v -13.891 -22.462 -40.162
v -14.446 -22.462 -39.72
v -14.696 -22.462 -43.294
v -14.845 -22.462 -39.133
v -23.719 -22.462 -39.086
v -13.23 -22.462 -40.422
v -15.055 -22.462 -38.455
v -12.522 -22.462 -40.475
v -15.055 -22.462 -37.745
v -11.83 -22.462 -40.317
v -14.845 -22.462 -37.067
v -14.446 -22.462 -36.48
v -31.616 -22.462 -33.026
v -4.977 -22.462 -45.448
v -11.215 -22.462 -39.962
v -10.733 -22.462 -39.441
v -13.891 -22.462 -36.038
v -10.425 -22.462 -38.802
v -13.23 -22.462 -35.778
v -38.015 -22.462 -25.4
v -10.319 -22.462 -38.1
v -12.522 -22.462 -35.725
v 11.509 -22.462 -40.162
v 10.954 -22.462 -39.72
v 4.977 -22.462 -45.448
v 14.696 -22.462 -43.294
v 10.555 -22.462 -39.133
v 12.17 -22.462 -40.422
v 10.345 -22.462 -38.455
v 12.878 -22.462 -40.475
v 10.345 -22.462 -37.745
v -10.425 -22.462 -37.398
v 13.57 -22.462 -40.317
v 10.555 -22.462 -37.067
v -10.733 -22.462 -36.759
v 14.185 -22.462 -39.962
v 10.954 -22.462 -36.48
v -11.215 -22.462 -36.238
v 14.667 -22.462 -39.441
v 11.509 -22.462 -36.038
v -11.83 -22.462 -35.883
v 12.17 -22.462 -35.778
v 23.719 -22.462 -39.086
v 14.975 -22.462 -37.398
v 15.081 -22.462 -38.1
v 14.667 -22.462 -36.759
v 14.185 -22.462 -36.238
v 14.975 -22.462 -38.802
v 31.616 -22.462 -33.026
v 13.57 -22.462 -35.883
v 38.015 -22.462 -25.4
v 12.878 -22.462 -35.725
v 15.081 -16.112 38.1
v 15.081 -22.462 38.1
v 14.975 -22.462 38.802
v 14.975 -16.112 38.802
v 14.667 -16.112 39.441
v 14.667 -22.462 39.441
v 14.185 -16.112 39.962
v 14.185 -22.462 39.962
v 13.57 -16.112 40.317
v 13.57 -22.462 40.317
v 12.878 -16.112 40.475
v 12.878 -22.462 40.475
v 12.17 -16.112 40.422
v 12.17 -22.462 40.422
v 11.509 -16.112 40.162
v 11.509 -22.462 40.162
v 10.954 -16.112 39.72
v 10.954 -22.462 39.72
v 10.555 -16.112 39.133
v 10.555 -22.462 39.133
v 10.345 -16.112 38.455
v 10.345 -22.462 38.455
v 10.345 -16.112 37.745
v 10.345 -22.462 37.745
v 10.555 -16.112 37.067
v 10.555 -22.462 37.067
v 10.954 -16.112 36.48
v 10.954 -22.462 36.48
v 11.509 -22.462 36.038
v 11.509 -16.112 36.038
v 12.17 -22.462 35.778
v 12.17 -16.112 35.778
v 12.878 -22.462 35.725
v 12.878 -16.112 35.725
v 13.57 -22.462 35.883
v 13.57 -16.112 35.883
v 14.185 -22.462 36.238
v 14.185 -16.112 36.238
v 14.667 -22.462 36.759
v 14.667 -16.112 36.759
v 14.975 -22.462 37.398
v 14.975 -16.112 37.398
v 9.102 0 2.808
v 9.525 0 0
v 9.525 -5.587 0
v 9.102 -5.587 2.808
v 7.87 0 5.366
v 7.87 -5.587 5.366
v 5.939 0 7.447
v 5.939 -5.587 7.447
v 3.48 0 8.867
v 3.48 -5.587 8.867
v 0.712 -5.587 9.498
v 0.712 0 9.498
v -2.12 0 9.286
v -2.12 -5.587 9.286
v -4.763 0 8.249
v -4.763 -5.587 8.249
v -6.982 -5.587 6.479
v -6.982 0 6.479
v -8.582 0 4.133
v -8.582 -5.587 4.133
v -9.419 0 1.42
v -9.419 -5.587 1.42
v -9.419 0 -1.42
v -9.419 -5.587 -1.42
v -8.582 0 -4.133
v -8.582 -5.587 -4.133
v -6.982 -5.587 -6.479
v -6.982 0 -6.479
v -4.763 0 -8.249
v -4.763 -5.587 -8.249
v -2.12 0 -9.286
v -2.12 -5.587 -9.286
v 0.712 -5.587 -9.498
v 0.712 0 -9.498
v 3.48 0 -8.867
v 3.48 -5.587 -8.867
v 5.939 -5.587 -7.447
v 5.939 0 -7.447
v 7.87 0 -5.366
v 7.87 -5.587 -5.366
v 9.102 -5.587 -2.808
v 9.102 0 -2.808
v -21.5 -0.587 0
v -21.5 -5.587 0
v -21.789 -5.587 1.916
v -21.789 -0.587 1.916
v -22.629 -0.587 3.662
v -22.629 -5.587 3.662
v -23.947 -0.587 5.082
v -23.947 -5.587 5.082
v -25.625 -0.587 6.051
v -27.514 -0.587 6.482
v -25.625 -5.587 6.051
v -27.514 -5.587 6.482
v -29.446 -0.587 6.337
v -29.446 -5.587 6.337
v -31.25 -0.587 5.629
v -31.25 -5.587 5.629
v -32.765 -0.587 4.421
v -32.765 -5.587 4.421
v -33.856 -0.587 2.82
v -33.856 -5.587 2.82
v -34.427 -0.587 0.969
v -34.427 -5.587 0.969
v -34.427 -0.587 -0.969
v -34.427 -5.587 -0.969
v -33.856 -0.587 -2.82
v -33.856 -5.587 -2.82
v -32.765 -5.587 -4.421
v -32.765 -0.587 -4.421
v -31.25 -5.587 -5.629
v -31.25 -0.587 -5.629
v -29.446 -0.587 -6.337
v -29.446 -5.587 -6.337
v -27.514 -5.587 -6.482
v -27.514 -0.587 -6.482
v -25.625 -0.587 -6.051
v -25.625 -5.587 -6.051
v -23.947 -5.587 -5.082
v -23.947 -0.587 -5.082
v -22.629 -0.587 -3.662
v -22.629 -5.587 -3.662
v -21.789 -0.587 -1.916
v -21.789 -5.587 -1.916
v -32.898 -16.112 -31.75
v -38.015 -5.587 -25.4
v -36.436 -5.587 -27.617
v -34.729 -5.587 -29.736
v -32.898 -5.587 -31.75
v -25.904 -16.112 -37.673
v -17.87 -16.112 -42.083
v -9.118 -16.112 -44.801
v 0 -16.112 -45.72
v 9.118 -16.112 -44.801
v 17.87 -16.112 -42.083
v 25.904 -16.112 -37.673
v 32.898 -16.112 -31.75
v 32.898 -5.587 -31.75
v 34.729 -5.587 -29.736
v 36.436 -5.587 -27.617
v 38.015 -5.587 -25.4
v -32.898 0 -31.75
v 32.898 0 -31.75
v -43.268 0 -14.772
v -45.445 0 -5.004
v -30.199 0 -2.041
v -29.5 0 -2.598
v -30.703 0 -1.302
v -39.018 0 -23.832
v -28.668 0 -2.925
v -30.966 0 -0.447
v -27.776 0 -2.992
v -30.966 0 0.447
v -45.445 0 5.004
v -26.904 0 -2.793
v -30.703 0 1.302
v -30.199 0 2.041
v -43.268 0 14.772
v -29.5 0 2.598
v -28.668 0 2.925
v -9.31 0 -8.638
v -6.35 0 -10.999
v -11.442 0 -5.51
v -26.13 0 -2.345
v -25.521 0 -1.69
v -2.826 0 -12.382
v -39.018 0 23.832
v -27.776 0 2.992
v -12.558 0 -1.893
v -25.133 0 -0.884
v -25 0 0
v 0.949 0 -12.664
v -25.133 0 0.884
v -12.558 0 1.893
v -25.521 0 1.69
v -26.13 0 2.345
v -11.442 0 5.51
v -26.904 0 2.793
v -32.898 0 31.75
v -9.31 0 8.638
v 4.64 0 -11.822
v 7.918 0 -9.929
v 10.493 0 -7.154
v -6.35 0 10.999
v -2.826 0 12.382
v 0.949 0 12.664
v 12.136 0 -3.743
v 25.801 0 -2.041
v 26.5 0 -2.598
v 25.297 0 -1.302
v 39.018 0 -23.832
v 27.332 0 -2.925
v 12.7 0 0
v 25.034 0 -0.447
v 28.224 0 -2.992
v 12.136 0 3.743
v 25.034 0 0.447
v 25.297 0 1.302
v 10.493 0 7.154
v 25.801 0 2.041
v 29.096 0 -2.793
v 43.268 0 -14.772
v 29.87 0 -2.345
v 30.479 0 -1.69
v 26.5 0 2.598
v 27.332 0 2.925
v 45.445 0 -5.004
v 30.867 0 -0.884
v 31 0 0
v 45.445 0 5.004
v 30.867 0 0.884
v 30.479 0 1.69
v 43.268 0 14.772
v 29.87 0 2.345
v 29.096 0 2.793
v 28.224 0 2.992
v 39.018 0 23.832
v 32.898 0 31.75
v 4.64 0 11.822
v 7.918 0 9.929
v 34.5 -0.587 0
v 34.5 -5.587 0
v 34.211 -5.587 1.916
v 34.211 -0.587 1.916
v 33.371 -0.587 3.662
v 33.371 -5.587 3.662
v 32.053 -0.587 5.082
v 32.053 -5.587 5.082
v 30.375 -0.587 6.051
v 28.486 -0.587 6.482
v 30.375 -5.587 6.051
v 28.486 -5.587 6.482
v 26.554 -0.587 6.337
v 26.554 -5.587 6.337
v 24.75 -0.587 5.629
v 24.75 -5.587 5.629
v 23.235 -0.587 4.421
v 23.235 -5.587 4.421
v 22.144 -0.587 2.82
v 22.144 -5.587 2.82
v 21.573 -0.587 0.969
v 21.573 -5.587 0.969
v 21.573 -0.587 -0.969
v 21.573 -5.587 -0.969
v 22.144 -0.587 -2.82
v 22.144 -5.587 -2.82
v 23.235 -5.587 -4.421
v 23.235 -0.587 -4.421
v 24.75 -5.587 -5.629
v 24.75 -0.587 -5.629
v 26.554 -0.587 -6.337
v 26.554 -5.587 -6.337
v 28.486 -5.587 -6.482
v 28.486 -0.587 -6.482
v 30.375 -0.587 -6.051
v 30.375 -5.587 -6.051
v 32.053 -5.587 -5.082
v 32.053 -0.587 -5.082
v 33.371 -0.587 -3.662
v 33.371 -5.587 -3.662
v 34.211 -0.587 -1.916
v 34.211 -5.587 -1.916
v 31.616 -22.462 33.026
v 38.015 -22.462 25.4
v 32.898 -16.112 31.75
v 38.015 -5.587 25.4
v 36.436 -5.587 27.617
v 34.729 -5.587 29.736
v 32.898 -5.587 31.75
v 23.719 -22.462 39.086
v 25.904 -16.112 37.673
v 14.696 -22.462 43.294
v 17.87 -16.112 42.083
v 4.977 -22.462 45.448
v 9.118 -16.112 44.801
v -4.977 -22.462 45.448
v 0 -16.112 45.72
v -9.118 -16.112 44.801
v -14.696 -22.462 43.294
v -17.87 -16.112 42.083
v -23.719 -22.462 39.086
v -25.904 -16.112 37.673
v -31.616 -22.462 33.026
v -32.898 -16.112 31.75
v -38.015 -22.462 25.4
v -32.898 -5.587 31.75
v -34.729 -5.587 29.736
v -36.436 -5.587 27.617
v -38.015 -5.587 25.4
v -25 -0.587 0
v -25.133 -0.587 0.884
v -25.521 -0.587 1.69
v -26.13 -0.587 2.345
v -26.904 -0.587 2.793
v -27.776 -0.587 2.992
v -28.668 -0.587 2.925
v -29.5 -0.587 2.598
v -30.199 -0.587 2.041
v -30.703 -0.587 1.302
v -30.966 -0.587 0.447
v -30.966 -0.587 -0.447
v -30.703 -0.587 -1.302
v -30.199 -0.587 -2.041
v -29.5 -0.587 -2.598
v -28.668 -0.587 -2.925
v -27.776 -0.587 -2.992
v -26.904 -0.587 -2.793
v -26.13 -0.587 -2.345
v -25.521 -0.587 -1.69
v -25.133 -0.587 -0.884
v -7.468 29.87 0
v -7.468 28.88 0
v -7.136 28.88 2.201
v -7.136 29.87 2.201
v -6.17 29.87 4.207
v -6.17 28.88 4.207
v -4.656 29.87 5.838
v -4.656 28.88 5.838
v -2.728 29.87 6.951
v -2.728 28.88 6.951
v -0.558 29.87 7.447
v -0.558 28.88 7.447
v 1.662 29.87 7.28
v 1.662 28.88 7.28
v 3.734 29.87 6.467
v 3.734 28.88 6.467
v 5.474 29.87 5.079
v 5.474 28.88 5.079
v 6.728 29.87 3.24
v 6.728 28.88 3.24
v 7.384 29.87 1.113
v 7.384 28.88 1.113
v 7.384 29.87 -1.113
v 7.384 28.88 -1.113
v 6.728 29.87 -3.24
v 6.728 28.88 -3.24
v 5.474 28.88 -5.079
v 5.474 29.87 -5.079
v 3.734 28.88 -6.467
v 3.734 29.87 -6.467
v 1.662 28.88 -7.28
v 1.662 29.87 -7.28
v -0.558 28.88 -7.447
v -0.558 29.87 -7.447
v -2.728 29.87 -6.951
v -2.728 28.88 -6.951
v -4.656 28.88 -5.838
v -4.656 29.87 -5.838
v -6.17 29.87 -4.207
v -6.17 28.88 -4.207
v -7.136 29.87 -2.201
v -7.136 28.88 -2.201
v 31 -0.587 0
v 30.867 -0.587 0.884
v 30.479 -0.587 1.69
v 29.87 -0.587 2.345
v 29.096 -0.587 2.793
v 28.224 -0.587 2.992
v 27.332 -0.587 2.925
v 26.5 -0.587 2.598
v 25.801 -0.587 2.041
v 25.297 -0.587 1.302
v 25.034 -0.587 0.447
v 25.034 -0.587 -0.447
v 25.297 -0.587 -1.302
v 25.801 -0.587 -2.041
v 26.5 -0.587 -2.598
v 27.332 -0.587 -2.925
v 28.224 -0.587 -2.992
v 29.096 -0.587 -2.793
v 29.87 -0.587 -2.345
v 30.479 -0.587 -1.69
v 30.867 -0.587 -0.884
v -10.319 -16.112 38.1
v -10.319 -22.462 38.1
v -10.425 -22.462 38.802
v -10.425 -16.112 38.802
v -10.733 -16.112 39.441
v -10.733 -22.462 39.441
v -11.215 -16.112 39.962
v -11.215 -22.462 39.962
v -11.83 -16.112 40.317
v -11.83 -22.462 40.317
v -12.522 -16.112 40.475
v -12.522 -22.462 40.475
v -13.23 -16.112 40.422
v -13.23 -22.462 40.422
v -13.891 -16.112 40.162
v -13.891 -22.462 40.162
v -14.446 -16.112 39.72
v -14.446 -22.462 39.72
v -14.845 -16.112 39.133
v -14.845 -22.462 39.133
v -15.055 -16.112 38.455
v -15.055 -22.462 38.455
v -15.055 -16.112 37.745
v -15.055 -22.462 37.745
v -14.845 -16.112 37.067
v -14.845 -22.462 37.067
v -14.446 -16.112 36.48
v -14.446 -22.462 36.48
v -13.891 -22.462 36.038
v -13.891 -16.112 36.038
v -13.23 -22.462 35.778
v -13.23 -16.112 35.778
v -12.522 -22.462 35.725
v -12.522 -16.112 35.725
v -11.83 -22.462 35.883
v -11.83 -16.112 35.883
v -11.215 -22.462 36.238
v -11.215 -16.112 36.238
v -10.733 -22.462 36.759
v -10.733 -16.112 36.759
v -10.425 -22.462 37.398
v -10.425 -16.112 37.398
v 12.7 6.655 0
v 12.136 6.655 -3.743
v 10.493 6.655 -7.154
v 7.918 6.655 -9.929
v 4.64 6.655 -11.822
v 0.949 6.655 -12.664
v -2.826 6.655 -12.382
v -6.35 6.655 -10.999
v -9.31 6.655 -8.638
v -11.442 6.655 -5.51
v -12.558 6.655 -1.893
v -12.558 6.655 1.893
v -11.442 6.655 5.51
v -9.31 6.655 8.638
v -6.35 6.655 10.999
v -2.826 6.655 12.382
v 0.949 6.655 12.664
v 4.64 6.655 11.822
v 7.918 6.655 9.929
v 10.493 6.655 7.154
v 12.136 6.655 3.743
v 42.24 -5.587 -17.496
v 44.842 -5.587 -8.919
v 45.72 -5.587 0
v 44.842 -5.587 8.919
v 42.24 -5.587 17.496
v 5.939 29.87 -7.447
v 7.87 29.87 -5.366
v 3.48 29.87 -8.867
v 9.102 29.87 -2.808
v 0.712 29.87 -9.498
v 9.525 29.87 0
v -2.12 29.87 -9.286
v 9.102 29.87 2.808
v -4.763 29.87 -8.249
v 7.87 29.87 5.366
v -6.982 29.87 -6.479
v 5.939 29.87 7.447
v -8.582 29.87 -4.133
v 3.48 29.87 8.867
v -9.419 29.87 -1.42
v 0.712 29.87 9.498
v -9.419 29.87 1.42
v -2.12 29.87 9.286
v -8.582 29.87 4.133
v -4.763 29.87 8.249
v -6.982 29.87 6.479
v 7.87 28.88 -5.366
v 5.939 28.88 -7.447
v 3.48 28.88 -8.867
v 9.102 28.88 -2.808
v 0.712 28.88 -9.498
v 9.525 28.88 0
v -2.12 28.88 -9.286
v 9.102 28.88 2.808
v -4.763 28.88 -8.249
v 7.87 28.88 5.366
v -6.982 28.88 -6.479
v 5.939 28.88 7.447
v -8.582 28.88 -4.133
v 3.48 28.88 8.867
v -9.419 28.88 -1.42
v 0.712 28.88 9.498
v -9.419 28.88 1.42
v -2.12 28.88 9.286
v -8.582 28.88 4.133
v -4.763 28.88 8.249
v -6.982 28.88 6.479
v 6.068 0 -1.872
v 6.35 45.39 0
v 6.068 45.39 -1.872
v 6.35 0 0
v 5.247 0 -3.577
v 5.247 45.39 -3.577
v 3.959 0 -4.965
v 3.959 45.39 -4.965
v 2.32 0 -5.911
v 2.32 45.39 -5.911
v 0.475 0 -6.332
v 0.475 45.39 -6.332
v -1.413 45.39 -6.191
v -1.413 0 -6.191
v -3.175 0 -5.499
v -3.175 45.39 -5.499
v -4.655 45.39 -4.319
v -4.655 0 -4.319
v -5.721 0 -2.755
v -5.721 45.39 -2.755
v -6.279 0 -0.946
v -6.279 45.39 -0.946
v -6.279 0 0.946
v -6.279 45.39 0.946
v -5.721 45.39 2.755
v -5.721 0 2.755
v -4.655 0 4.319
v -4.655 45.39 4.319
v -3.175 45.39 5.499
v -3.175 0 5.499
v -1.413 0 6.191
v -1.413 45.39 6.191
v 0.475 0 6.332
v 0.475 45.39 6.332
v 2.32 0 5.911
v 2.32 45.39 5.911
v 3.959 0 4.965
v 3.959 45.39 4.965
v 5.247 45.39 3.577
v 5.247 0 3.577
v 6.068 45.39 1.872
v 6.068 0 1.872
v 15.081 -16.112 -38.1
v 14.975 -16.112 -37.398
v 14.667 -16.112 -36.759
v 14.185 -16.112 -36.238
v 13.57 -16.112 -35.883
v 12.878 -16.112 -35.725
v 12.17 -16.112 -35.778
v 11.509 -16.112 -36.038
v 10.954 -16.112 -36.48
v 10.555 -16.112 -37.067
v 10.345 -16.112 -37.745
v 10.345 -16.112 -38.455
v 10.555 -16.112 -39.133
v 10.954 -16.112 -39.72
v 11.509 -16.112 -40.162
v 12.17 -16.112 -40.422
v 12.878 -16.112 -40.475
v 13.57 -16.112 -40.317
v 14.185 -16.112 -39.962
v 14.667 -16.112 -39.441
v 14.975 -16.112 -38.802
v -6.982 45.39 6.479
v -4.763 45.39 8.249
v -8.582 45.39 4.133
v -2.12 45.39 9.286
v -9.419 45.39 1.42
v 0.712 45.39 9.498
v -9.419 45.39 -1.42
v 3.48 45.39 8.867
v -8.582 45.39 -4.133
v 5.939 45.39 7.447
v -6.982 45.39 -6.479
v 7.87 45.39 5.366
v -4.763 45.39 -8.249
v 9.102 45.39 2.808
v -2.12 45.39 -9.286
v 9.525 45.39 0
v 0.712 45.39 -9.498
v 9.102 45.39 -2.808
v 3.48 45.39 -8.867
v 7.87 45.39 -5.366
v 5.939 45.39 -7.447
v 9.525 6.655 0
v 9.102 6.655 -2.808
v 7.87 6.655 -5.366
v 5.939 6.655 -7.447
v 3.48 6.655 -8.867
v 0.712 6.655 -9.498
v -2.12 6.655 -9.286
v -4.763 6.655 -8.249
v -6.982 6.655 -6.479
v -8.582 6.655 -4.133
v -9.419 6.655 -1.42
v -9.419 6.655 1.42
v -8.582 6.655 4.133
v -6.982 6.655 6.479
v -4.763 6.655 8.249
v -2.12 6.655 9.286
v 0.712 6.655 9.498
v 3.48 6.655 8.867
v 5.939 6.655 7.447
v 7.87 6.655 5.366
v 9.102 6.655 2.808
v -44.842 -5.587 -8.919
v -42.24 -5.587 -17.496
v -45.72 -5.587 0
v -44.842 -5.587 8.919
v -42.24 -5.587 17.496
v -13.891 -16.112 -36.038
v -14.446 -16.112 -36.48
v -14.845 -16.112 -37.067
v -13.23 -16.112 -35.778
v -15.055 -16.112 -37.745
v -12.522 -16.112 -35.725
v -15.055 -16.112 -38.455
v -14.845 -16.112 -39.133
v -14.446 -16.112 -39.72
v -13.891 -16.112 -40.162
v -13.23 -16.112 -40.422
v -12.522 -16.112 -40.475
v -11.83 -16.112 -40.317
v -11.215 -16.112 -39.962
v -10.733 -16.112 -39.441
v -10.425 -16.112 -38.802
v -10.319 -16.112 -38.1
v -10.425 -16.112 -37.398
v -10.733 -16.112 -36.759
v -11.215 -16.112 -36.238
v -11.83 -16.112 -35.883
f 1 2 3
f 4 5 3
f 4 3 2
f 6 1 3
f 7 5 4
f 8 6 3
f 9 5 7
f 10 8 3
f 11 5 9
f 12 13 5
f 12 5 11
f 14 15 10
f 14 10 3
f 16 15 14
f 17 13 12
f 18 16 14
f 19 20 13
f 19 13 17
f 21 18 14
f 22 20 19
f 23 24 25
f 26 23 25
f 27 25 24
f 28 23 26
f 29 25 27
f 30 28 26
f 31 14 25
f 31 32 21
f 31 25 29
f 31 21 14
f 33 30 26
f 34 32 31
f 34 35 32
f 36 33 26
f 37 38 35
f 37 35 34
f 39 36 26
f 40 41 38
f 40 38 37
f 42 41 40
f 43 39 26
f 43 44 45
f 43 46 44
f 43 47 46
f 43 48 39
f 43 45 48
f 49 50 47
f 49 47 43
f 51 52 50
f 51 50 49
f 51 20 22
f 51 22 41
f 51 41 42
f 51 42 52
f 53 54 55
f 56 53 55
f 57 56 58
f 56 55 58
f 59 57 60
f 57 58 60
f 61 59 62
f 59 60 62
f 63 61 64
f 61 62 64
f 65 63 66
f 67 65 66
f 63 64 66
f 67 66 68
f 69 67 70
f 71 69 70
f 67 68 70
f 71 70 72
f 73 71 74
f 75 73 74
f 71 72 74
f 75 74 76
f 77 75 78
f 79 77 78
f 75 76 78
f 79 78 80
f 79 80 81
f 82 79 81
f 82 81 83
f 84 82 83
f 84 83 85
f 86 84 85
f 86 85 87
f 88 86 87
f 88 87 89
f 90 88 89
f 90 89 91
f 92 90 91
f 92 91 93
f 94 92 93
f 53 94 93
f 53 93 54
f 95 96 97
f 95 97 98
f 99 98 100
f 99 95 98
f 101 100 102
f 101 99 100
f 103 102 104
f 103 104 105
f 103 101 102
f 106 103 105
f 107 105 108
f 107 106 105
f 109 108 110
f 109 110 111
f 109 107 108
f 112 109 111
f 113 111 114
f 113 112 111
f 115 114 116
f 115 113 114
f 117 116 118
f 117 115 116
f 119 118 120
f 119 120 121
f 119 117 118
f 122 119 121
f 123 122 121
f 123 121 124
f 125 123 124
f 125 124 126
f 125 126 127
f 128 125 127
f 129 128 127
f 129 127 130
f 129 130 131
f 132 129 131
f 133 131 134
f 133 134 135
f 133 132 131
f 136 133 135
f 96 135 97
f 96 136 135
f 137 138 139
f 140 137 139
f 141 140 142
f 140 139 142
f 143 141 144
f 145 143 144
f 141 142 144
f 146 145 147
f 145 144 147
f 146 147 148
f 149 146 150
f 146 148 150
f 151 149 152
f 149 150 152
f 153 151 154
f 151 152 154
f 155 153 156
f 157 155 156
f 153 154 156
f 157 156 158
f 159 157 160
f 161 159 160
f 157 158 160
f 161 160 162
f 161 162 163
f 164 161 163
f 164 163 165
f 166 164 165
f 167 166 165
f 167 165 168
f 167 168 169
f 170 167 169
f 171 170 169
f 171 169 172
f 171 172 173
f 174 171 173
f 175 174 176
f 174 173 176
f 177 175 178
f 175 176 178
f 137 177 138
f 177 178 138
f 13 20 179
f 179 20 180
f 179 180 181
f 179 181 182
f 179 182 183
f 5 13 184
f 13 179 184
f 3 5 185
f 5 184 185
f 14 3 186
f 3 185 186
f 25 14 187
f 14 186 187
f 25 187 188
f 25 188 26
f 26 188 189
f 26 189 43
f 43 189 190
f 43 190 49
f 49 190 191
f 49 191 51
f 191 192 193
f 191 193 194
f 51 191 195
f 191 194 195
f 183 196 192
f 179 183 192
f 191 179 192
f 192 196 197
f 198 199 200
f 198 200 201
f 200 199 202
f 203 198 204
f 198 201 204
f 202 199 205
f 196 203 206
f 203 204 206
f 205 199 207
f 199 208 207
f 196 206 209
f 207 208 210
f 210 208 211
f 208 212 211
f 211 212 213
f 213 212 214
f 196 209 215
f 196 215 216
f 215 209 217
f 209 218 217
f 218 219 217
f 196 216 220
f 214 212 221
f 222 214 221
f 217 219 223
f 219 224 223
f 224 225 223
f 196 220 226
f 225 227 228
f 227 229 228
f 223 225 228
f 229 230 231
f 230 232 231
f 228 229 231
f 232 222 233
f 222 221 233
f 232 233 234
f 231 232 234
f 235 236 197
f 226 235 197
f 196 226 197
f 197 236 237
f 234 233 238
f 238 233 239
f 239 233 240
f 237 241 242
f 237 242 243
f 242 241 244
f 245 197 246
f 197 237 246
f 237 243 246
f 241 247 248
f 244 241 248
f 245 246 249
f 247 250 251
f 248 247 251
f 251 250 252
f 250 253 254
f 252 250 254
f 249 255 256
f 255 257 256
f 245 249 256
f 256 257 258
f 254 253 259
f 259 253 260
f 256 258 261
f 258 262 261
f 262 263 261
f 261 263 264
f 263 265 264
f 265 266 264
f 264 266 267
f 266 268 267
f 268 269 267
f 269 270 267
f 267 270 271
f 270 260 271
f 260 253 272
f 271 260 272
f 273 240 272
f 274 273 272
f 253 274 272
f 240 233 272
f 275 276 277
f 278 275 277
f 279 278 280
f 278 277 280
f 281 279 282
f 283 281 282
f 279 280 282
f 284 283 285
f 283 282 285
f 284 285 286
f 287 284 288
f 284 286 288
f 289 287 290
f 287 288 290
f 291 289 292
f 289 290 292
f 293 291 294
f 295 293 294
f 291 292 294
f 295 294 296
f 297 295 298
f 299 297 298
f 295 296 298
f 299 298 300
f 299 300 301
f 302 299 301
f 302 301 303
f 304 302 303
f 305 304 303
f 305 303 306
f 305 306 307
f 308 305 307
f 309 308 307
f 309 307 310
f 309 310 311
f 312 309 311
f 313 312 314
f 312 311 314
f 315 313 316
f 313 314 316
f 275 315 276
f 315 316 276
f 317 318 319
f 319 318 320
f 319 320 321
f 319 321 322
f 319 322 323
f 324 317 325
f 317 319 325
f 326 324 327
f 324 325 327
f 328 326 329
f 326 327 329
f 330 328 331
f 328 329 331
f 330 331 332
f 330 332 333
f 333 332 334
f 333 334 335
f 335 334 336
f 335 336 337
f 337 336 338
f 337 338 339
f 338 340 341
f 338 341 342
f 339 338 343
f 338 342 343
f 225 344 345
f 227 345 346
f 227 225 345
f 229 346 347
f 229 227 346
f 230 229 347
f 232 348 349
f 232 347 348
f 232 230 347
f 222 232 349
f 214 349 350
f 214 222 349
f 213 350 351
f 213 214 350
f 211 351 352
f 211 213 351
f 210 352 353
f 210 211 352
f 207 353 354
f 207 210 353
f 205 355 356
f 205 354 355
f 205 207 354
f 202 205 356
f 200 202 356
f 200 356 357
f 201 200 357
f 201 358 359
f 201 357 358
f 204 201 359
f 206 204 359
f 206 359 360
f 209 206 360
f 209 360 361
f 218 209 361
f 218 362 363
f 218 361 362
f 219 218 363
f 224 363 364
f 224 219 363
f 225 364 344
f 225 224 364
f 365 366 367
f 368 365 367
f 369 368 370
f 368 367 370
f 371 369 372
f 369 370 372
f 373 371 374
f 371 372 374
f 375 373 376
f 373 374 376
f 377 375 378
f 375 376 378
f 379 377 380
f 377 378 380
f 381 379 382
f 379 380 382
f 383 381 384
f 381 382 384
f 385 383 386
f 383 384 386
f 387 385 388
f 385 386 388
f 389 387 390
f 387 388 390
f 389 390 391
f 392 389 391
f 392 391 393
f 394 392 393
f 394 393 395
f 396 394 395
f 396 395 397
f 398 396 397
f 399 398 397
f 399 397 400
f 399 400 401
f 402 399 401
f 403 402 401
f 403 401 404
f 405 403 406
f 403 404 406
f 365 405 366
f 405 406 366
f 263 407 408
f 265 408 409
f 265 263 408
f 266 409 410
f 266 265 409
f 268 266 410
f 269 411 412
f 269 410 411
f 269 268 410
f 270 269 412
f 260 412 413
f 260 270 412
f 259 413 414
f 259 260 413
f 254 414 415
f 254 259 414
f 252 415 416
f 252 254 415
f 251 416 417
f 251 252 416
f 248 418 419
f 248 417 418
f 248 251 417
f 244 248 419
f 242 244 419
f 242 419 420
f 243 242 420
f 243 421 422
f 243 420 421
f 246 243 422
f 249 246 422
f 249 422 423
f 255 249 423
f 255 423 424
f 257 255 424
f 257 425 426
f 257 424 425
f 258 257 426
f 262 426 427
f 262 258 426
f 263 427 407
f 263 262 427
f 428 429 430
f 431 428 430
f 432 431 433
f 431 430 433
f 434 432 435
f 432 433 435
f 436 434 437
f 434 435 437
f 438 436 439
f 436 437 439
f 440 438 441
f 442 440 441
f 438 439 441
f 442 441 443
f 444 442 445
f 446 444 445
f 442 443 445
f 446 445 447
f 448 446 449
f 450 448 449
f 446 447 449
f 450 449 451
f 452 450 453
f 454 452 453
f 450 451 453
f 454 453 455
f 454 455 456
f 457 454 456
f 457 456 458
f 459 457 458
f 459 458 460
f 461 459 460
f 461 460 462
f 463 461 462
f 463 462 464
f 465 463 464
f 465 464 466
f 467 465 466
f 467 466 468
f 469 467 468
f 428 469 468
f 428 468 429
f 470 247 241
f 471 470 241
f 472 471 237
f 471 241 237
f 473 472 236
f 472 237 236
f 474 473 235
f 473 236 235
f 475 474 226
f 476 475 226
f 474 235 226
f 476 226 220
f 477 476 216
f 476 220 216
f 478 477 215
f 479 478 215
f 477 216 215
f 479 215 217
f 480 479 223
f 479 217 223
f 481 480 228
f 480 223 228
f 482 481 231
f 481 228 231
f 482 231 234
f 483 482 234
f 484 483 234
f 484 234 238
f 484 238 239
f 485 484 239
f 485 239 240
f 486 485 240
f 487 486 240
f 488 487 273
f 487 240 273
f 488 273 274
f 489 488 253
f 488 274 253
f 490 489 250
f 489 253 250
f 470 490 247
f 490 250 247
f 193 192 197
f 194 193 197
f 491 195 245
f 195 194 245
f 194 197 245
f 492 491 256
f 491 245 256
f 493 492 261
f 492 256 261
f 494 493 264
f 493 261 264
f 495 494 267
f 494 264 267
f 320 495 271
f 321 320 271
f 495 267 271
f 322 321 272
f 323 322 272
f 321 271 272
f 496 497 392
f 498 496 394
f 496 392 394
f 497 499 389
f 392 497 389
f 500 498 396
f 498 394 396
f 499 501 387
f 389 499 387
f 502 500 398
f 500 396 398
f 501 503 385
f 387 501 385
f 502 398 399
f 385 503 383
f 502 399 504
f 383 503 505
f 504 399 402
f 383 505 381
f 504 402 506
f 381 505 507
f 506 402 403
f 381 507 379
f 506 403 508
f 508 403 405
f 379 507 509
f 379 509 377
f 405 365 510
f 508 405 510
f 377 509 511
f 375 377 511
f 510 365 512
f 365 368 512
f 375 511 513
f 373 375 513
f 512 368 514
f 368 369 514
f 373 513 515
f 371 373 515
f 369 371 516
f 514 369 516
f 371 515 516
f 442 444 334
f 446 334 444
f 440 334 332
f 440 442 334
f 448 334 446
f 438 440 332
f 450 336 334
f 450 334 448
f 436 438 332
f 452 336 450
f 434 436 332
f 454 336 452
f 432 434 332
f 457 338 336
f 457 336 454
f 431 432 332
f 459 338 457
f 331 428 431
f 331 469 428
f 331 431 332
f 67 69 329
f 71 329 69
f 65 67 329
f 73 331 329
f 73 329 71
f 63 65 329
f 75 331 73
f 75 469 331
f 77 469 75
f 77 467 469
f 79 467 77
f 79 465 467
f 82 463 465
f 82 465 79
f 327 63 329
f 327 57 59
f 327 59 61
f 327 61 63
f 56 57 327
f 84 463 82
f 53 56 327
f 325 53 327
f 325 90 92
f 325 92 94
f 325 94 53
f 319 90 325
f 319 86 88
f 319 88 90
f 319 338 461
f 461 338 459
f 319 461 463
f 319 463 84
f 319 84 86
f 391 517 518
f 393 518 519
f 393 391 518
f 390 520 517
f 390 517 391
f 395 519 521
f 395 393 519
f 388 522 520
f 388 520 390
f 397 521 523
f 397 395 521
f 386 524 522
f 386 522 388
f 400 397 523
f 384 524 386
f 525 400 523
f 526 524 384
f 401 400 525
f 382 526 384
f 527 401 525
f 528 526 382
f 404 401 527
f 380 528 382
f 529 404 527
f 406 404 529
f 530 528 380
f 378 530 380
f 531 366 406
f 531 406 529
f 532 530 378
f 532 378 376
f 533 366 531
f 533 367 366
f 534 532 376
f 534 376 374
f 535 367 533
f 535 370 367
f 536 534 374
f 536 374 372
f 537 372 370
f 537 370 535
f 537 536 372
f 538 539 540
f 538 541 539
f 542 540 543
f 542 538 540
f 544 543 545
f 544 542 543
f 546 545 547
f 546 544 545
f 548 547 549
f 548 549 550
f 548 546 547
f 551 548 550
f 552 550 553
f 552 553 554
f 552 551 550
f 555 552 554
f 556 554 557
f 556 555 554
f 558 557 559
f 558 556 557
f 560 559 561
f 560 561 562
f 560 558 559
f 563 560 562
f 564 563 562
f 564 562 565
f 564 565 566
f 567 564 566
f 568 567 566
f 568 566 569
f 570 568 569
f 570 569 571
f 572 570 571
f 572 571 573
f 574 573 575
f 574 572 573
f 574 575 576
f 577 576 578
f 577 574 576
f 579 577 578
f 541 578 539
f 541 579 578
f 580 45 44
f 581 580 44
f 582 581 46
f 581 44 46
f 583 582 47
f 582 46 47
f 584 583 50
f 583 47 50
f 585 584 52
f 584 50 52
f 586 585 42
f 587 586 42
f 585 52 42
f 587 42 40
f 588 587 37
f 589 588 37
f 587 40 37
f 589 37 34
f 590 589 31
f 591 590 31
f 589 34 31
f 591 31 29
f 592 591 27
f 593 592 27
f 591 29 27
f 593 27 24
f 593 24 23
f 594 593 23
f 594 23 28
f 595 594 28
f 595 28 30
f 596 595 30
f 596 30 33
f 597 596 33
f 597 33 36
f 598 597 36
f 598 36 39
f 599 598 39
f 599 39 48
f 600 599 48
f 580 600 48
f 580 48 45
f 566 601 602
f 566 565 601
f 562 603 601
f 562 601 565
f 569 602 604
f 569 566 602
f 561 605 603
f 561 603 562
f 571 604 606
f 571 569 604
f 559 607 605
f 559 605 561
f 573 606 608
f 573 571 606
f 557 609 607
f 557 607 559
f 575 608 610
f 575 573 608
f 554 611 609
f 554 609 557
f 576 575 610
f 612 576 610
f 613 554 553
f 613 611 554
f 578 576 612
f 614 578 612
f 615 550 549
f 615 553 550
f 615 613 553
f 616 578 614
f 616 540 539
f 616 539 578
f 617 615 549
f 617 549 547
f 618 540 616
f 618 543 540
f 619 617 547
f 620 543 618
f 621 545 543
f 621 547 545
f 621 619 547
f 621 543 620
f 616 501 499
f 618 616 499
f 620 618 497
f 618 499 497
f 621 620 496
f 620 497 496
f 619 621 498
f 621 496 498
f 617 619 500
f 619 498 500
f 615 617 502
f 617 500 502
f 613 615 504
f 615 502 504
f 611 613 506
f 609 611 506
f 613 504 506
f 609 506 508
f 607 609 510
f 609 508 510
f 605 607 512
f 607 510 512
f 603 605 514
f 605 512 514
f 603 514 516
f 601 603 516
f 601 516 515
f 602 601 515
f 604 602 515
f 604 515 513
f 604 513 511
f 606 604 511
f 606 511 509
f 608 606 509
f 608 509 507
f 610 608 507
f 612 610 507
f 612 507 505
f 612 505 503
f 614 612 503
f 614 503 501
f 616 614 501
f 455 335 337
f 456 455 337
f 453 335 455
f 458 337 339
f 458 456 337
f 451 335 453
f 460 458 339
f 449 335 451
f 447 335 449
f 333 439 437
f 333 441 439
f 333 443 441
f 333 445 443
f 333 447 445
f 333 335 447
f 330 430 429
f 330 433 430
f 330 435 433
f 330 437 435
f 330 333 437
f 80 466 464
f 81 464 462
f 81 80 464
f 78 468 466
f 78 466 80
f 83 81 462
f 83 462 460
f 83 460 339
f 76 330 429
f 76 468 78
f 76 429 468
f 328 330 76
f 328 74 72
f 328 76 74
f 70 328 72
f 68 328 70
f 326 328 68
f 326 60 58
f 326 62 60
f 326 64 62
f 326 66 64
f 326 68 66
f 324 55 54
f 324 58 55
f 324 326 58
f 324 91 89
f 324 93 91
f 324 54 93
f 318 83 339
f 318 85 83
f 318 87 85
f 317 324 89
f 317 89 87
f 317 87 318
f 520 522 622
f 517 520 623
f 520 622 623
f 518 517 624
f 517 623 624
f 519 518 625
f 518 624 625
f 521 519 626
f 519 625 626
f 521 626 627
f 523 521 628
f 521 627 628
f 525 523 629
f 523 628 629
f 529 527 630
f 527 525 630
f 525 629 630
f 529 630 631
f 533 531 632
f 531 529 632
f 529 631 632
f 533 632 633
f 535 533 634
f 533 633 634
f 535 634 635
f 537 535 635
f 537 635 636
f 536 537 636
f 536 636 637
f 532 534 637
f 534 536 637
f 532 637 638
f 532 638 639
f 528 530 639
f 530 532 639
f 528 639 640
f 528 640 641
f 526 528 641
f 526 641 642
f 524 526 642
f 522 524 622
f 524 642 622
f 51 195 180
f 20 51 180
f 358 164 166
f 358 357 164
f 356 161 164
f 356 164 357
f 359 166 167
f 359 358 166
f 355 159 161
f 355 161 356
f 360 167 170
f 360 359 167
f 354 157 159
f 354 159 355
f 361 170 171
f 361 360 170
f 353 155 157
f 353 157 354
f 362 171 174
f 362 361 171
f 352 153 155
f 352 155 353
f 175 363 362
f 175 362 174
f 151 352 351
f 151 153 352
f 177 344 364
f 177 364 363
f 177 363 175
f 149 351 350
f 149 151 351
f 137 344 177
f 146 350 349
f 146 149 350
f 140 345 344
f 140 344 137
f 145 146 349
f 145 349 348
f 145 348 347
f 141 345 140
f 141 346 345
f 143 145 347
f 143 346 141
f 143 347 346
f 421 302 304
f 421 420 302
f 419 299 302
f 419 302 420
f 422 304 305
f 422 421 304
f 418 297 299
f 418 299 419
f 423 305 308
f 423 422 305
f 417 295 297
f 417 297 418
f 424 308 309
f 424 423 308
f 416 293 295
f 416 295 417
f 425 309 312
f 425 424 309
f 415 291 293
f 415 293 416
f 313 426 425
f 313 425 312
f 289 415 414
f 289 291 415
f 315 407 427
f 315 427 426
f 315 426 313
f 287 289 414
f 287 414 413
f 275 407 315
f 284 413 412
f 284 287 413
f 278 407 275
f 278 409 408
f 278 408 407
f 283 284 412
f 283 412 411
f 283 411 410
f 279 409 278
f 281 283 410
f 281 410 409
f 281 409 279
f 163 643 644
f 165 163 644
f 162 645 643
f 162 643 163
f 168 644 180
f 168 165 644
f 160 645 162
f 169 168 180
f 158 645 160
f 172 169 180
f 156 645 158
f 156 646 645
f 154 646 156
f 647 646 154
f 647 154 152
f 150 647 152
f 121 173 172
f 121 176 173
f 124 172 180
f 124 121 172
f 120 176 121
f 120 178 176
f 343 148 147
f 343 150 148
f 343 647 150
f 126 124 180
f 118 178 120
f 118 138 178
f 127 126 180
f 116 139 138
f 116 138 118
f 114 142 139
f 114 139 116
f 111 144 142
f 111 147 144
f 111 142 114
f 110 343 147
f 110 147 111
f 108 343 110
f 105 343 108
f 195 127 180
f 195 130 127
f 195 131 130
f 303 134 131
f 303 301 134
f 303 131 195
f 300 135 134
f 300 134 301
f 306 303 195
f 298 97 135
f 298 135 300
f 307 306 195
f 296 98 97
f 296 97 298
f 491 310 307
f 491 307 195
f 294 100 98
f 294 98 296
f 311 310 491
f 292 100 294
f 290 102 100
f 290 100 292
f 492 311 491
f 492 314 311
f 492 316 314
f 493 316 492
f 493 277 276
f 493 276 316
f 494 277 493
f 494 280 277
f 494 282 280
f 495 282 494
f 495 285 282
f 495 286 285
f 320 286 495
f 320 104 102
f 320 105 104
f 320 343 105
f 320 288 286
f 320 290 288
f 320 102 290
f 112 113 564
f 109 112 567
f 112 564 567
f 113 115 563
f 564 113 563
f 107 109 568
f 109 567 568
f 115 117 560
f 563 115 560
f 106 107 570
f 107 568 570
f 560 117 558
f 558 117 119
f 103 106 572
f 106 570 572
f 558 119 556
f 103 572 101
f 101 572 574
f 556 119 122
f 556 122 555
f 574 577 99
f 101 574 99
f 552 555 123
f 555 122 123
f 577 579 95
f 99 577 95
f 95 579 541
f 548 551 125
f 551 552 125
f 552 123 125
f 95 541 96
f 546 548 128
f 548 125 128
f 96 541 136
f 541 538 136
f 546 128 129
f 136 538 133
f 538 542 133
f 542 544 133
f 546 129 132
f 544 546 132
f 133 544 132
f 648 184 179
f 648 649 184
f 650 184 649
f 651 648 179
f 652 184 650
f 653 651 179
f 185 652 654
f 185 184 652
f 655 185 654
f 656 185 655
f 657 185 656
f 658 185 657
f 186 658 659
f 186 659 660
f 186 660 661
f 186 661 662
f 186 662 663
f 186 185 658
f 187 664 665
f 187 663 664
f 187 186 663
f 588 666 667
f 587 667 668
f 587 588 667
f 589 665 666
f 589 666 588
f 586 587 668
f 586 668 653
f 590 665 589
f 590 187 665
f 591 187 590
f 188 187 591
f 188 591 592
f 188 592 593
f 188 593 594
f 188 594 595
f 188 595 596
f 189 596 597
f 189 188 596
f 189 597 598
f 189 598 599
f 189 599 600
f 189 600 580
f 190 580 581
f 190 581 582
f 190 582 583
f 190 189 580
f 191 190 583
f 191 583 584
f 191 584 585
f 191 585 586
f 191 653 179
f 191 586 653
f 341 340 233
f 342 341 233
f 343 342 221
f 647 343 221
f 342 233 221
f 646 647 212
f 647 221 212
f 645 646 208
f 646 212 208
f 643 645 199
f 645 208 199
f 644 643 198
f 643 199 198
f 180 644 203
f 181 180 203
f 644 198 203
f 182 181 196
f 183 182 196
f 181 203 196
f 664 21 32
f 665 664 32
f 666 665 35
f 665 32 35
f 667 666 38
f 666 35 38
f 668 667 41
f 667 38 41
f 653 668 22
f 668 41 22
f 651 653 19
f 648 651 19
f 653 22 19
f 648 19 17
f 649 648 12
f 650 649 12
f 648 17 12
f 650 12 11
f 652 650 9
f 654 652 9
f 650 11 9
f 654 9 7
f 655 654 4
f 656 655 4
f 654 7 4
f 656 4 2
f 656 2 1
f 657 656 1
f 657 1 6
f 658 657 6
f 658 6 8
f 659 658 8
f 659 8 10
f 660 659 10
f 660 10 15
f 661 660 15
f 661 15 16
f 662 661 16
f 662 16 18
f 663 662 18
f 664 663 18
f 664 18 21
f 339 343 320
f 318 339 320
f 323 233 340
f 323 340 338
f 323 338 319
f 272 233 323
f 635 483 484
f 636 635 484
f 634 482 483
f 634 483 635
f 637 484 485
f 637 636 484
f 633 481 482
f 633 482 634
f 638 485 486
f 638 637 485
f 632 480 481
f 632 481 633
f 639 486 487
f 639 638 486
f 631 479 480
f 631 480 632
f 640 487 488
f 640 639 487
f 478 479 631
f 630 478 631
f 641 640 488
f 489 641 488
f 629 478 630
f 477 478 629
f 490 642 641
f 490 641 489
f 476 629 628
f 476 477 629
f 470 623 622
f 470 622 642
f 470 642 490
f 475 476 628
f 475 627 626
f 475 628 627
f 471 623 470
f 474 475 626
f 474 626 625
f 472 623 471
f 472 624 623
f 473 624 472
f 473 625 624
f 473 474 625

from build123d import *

# Parameters (mm, degrees)
SKETCH1_R           = 12.7
SKETCH1_R_2         = 6.35
BOSS_EXTRUDE1_DEPTH = 6.6548
SKETCH2_R           = 9.525
SKETCH2_R_2         = 6.35
BOSS_EXTRUDE2_DEPTH = 38.735
SKETCH3_OUTSIDE_W   = 38.976
SKETCH3_OUTSIDE_H   = 38.976
SKETCH3_OUTSIDE_R   = 7.4676
CUT_EXTRUDE1_DEPTH  = 0.9906
SKETCH5_R           = 45.72
SKETCH5_R_2         = 9.525
SKETCH5_R_3         = 3
BOSS_EXTRUDE4_DEPTH = 5.587499906
SKETCH6_R           = 6.5
CUT_EXTRUDE5_DEPTH  = 4.999999906
BOSS_EXTRUDE5_DEPTH = 16.875
SKETCH9_R           = 2.38125
CUT_EXTRUDE7_DEPTH  = 22.4625
SKETCH12_W          = 91.44
SKETCH12_H          = 13.97
CUT_EXTRUDE10_DEPTH = 16.1125


with BuildPart() as part:
    # Sketch1 → Boss-Extrude1 (new body)
    with BuildSketch(Plane(origin=(0, 0, 0), x_dir=(1, 0, 0), z_dir=(0, 1, 0))):
        Circle(SKETCH1_R)
        Circle(SKETCH1_R_2, mode=Mode.SUBTRACT)
    extrude(amount=BOSS_EXTRUDE1_DEPTH)

    # Sketch2 → Boss-Extrude2 (add)
    with BuildSketch(Plane(origin=(0, 6.6548, 0), x_dir=(1, 0, 0), z_dir=(0, 1, 0))):
        Circle(SKETCH2_R)
        Circle(SKETCH2_R_2, mode=Mode.SUBTRACT)
    extrude(amount=BOSS_EXTRUDE2_DEPTH)

    # Sketch3 outside → Cut-Extrude1 (cut)
    with BuildSketch(Plane(origin=(0, 28.8798, 0), x_dir=(-1, 0, 0), z_dir=(0, 1, 0))):
        Rectangle(SKETCH3_OUTSIDE_W, SKETCH3_OUTSIDE_H)
        Circle(SKETCH3_OUTSIDE_R, mode=Mode.SUBTRACT)
    extrude(amount=CUT_EXTRUDE1_DEPTH, mode=Mode.SUBTRACT)

    # Sketch5 → Boss-Extrude4 (add)
    with BuildSketch(Plane.XZ):
        Circle(SKETCH5_R)
        Circle(SKETCH5_R_2, mode=Mode.SUBTRACT)
        with Locations((28, 0)):
            Circle(SKETCH5_R_3, mode=Mode.SUBTRACT)
        with Locations((-28, 0)):
            Circle(SKETCH5_R_3, mode=Mode.SUBTRACT)
    extrude(amount=BOSS_EXTRUDE4_DEPTH)

    # Sketch6 → Cut-Extrude5 (cut)
    with BuildSketch(Plane.XZ.offset(5.587499906)):
        with Locations((-28, 0)):
            Circle(SKETCH6_R)
        with Locations((28, 0)):
            Circle(SKETCH6_R)
    extrude(amount=-CUT_EXTRUDE5_DEPTH, mode=Mode.SUBTRACT)

    # Sketch8 → Boss-Extrude5 (add)
    with BuildSketch(Plane.XZ.offset(5.587499906)):
        with BuildLine():
            Line((38.01523905, -25.4), (-38.01523905, -25.4))
            ThreePointArc((-38.01523905, -25.4), (0, -45.72), (38.01523905, -25.4))
        make_face()
        with BuildLine():
            ThreePointArc((38.01523905, 25.4), (0, 45.72), (-38.01523905, 25.4))
            Line((-38.01523905, 25.4), (38.01523905, 25.4))
        make_face()
    extrude(amount=BOSS_EXTRUDE5_DEPTH)

    # Sketch9 → Cut-Extrude7 (cut)
    with BuildSketch(Plane.XZ.offset(22.462499906)):
        with Locations((12.7, 38.1)):
            Circle(SKETCH9_R)
        with Locations((-12.7, 38.1)):
            Circle(SKETCH9_R)
        with Locations((-12.7, -38.1)):
            Circle(SKETCH9_R)
        with Locations((12.7, -38.1)):
            Circle(SKETCH9_R)
    extrude(amount=-CUT_EXTRUDE7_DEPTH, mode=Mode.SUBTRACT)

    # Sketch12 → Cut-Extrude10 (cut)
    with BuildSketch(Plane(origin=(0, 0, 0), x_dir=(1, 0, 0), z_dir=(0, 1, 0))):
        with Locations((0, -38.735)):
            Rectangle(SKETCH12_W, SKETCH12_H)
        with Locations((0, 38.735)):
            Rectangle(SKETCH12_W, SKETCH12_H)
    extrude(amount=-CUT_EXTRUDE10_DEPTH, mode=Mode.SUBTRACT)


solid = part.part
